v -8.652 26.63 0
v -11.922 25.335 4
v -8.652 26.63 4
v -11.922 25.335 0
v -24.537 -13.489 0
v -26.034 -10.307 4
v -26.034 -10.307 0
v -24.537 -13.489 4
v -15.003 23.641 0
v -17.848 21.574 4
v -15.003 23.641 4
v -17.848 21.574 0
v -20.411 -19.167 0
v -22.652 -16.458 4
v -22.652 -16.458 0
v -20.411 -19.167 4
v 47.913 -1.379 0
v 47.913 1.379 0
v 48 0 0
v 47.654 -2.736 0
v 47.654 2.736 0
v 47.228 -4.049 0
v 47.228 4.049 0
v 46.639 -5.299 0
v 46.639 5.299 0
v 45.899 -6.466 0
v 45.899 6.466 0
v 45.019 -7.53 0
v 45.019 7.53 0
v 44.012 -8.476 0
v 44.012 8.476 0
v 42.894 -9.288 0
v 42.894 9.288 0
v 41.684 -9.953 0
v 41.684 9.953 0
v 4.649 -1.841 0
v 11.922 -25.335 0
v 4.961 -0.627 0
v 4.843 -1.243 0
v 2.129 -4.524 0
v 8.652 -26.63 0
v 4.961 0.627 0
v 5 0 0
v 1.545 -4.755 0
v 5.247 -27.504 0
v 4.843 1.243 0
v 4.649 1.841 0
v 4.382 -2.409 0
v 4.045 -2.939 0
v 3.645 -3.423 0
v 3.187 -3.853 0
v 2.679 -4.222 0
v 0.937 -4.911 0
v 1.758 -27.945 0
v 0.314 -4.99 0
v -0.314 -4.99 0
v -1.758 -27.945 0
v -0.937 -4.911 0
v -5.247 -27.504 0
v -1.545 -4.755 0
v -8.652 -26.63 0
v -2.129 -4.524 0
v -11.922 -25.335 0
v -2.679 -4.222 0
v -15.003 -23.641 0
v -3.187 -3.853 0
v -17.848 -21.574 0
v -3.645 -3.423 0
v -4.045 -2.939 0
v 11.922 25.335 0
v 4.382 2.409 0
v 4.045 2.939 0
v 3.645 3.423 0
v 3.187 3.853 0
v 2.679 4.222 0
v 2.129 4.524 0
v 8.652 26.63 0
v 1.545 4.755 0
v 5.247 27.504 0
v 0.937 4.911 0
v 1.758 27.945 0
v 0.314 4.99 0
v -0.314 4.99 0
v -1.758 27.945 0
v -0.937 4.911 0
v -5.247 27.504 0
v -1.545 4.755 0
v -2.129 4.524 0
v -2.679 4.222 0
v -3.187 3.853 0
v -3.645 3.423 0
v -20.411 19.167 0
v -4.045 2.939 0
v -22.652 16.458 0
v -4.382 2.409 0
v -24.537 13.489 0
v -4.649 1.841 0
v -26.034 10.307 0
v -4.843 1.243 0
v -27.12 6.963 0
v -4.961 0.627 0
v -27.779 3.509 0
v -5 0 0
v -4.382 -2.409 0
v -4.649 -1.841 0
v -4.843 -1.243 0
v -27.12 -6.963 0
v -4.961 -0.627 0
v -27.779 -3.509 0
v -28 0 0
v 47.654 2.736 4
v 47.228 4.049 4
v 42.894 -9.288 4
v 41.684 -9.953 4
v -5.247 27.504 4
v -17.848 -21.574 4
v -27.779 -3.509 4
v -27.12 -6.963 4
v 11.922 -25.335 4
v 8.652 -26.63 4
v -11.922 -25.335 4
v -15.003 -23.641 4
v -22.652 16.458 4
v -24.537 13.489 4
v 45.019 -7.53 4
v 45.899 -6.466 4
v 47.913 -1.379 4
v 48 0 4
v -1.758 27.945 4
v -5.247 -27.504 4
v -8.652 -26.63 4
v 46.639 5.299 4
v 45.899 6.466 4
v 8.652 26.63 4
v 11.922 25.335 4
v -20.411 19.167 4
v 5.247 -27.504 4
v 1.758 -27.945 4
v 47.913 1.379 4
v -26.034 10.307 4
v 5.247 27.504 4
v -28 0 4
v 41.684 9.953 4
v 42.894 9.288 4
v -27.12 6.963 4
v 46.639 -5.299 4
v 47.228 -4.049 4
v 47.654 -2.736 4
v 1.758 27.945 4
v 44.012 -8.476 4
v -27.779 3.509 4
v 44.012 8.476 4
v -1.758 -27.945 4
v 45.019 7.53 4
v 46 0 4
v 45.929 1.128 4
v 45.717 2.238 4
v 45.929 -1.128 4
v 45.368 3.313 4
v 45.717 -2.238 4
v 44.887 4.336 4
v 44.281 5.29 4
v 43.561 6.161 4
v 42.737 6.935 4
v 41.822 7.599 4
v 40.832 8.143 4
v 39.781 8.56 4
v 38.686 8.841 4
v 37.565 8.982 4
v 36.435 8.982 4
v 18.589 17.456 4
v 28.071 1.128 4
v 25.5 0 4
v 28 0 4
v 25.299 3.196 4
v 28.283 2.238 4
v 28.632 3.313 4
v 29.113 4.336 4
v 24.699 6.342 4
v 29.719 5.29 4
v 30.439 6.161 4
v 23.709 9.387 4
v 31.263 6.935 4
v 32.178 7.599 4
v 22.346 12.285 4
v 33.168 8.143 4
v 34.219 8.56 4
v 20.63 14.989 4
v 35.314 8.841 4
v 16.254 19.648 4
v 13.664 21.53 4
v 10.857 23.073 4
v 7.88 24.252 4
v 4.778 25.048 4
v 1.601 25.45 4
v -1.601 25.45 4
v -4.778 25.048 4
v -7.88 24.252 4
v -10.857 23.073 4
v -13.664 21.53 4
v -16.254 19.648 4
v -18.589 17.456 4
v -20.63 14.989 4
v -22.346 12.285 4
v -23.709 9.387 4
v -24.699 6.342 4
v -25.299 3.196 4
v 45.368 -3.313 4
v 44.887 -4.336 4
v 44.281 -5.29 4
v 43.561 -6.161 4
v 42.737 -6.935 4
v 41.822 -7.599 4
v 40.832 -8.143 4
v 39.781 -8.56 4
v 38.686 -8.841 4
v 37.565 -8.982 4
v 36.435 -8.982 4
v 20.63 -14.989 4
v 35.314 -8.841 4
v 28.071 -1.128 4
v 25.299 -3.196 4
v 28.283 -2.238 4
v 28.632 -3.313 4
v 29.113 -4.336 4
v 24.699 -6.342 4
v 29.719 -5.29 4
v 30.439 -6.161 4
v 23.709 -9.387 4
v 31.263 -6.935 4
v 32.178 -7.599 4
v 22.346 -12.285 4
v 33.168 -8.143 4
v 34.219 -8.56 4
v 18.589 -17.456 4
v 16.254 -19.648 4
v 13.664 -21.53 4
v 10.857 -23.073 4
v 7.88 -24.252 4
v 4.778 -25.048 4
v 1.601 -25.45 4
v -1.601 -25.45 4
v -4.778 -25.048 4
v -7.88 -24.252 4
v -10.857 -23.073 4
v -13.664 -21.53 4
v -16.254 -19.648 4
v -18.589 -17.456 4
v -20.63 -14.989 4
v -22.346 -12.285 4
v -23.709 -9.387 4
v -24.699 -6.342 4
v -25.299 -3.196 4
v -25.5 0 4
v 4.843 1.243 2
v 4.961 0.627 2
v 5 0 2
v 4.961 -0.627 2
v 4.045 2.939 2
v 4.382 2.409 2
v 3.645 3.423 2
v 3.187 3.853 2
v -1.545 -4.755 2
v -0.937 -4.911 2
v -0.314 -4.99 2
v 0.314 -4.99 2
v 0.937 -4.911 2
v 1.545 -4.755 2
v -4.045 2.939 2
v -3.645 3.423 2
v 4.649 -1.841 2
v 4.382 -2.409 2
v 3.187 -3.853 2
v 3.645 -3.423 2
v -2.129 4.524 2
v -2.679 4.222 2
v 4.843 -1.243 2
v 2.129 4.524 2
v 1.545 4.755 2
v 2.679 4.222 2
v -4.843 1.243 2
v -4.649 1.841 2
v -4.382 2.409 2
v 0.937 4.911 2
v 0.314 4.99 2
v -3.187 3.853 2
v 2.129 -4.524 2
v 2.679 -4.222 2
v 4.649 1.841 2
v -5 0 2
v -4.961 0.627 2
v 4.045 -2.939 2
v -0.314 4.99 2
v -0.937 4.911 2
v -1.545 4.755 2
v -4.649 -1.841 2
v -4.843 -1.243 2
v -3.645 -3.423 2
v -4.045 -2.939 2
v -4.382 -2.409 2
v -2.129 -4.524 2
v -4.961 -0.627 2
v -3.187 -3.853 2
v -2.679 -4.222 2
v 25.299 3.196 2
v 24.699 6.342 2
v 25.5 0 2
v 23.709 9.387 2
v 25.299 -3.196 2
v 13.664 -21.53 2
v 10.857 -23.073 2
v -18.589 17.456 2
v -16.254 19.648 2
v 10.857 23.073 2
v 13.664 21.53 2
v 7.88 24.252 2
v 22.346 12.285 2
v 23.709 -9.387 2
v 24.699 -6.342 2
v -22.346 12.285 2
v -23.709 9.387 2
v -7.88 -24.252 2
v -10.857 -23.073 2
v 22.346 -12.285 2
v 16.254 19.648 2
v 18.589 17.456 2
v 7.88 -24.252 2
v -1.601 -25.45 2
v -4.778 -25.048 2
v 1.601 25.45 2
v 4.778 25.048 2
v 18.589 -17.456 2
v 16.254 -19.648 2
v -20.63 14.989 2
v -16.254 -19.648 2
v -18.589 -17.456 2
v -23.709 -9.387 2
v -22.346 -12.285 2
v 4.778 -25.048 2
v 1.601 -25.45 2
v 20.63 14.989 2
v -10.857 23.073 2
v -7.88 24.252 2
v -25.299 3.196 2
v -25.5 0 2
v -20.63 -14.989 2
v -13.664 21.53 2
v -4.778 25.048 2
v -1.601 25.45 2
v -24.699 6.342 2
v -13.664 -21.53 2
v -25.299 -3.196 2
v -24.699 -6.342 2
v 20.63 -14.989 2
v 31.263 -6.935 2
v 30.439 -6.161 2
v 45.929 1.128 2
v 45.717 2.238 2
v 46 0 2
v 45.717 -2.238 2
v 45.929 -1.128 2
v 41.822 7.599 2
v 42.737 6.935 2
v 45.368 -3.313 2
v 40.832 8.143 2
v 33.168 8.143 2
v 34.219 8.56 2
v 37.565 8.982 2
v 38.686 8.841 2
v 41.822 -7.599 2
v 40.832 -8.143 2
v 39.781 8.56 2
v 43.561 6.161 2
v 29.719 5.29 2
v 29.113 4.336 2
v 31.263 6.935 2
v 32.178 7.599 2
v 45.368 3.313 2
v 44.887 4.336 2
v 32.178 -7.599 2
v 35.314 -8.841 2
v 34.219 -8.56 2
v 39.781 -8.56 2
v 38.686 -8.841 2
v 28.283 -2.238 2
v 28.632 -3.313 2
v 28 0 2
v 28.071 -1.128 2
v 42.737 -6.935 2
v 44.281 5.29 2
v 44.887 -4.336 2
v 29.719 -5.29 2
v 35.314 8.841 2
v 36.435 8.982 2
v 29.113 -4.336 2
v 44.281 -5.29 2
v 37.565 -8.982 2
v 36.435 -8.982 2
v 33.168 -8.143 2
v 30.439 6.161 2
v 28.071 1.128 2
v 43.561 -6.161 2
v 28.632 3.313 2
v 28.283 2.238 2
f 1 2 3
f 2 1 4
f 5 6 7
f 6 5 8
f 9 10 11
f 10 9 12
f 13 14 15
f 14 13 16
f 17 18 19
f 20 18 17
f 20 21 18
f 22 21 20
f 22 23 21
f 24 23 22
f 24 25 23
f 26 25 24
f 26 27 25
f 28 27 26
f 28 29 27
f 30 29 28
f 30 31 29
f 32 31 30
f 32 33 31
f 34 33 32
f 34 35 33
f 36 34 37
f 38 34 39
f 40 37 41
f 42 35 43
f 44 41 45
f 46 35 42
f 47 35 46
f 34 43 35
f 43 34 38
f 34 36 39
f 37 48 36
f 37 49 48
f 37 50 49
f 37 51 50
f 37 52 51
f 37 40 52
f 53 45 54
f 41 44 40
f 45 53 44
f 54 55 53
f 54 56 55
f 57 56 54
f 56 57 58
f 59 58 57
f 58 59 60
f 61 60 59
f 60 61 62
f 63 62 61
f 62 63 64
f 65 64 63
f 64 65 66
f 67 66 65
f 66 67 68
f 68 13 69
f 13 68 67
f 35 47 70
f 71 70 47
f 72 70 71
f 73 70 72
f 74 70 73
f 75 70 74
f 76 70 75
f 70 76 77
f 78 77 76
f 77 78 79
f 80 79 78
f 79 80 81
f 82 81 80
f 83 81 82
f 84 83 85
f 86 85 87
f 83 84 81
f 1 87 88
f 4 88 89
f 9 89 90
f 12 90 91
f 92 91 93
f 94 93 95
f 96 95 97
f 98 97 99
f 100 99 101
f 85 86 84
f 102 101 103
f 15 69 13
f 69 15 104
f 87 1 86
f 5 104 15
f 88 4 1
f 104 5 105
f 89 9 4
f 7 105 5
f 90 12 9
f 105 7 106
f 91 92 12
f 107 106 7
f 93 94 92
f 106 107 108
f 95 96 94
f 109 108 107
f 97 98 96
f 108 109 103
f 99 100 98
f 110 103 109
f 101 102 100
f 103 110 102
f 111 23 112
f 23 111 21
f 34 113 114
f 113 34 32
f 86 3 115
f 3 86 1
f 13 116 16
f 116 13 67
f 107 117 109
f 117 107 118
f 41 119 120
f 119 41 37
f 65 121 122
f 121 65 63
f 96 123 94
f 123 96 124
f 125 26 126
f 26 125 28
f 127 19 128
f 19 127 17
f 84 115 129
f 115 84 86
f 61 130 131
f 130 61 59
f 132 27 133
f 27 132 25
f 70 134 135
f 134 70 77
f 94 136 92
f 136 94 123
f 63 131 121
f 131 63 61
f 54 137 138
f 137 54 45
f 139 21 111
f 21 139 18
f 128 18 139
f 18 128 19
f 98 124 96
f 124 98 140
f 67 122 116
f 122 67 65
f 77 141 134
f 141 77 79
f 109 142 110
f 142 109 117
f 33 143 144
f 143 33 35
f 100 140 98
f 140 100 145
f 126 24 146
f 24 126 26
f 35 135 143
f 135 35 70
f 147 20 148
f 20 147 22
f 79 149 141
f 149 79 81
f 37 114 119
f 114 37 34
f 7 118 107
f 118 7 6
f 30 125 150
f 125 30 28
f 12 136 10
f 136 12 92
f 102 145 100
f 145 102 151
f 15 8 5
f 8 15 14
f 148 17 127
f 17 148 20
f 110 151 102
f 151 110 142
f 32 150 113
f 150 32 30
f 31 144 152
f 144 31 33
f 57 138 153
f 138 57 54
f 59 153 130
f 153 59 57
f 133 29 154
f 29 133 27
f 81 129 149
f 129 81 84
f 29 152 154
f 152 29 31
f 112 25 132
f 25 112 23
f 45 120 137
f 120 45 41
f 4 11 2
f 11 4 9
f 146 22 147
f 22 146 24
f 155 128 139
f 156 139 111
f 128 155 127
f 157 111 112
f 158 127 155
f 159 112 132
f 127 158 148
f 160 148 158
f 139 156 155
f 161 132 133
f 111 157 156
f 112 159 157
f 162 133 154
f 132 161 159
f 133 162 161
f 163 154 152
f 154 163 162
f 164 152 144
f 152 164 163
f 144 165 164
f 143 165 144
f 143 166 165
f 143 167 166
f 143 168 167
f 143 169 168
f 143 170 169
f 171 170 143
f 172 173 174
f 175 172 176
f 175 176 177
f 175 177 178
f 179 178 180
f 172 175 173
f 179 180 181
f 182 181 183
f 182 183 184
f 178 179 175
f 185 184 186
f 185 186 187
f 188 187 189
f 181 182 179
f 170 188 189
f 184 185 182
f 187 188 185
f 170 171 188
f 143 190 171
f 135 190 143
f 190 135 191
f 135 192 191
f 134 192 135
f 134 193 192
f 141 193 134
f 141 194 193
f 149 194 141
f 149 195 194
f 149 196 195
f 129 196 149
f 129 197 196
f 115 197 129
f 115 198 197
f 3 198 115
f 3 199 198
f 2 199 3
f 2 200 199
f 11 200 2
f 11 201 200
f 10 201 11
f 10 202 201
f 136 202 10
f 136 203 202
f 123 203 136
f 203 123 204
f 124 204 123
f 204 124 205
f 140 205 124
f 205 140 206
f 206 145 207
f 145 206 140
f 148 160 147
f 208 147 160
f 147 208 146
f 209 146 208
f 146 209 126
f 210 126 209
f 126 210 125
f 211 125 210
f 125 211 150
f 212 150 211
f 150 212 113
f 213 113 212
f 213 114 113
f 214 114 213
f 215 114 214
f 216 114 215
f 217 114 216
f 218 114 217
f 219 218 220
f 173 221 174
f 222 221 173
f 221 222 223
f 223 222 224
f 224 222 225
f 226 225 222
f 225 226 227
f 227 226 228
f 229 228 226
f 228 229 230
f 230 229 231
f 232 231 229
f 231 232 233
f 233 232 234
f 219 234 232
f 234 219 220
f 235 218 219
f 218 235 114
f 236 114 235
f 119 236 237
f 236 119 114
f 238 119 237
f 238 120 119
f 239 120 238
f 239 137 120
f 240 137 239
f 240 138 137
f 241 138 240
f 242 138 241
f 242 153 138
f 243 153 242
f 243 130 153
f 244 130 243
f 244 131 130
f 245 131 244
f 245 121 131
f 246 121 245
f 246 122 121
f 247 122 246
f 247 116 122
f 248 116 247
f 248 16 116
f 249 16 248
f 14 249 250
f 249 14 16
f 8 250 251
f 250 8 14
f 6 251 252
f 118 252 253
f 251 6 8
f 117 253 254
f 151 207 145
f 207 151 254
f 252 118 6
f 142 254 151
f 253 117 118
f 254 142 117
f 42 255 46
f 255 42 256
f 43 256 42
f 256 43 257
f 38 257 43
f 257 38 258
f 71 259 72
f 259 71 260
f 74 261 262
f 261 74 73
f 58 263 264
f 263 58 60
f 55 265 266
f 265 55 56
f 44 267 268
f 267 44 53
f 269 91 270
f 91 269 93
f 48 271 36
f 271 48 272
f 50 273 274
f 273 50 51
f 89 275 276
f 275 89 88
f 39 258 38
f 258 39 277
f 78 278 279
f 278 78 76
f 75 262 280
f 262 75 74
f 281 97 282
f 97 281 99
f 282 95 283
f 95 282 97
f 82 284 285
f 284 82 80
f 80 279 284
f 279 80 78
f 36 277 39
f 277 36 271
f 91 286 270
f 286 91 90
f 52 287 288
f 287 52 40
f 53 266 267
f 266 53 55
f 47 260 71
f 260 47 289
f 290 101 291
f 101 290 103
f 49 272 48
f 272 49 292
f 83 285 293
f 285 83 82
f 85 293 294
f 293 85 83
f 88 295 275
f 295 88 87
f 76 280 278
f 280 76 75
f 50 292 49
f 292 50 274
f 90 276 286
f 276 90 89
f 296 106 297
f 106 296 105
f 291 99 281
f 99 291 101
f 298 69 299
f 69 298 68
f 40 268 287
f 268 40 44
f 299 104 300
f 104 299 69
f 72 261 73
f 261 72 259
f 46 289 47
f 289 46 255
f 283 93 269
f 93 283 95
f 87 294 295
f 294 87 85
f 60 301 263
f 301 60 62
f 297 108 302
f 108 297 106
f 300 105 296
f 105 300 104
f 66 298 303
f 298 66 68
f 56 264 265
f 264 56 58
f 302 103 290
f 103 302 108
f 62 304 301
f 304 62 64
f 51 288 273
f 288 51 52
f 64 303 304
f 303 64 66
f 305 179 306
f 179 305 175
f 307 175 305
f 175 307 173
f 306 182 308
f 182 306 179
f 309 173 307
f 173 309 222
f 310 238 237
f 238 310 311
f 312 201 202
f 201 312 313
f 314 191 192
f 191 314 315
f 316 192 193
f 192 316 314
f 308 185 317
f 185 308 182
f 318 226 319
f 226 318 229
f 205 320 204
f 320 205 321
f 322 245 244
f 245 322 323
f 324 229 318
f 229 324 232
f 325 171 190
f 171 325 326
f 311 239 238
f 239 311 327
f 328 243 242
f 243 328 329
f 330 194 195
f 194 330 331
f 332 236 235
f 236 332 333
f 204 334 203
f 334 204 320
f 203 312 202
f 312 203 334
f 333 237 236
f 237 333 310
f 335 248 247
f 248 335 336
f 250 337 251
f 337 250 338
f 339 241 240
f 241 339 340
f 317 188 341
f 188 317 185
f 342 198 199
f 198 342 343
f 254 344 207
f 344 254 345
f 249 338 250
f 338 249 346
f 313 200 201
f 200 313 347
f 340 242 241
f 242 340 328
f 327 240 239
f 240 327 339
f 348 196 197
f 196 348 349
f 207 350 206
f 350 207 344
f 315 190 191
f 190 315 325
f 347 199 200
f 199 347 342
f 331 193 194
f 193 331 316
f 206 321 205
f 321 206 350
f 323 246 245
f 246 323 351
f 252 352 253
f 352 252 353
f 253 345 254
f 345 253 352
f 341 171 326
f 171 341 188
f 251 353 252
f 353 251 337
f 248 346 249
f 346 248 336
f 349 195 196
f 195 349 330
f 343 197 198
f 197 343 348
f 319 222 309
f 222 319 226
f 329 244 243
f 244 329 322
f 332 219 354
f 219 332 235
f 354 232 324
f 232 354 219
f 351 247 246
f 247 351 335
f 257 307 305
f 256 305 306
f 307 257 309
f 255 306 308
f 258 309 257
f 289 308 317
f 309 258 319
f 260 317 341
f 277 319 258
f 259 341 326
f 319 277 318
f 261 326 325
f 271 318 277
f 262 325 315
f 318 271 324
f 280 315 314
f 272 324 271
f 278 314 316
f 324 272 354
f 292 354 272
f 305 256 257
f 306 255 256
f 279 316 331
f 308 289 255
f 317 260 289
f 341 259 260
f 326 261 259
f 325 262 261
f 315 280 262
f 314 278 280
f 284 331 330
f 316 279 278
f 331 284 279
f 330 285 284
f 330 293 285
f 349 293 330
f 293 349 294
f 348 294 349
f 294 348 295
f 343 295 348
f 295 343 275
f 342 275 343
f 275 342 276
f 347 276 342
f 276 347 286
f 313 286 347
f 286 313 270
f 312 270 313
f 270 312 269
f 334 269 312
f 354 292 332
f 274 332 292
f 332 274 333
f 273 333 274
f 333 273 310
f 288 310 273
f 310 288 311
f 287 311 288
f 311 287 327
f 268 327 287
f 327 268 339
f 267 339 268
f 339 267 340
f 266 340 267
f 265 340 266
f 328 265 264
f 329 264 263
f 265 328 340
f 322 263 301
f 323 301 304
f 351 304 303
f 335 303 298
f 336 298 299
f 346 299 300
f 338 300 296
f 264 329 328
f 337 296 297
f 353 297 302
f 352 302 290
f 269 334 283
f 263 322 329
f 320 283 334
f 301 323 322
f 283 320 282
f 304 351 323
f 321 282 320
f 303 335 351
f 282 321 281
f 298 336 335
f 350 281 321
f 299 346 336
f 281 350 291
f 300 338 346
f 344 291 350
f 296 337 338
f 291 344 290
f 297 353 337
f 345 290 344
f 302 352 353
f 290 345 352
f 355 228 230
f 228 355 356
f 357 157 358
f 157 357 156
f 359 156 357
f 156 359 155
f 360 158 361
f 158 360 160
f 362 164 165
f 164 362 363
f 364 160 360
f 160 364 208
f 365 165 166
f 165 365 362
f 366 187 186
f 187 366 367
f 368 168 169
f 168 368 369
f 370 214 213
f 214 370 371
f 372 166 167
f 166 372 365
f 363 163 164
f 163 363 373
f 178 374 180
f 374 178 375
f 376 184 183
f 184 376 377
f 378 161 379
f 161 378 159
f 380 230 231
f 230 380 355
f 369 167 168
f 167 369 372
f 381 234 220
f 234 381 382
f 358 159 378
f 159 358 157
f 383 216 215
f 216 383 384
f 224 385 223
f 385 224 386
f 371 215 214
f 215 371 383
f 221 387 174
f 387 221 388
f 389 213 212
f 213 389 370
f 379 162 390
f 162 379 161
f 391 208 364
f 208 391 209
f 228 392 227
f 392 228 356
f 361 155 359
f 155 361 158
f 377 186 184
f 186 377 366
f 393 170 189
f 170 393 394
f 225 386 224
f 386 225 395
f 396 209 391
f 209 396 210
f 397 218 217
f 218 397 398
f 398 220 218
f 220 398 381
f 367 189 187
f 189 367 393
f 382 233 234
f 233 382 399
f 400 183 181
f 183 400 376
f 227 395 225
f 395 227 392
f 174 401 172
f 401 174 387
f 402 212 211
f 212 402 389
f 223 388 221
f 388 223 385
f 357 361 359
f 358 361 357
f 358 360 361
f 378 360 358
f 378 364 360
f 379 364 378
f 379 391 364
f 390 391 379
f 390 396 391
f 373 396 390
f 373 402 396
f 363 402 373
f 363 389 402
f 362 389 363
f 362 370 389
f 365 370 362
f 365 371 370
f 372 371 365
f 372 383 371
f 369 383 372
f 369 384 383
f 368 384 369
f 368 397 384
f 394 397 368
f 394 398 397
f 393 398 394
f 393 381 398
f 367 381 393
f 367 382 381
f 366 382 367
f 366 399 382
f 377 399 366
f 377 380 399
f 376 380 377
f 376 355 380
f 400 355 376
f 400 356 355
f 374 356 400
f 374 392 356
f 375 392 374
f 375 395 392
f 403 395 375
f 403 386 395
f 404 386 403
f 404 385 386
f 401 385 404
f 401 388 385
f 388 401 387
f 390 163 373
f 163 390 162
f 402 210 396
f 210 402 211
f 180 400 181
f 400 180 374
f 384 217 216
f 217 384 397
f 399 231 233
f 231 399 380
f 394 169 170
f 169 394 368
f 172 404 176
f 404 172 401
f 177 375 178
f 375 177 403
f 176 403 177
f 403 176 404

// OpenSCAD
// Tripod head, base diameter
head_diameter = 51; // possible values
//bubble level diameter
bubble_diameter = 18; // possible values

difference()
    {
        difference()
        {
            difference()
            {
            hull()
                {
                cylinder($fn=50, 4, d=head_diameter+5, true);
                translate([(head_diameter/2) + (bubble_diameter/2) + 2.5,0,0]) cylinder($fn=50, 4, d=bubble_diameter+4, true);
                }
            translate([0,0,-10]) cylinder($fn=50, 20, d=10);
            }
        translate([0,0,2]) cylinder($fn=50, 4, d=head_diameter, true);
        }
    translate([(head_diameter/2) + (bubble_diameter/2) + 2.5,0,2]) cylinder($fn=50, 4, d=bubble_diameter, true);
    }
